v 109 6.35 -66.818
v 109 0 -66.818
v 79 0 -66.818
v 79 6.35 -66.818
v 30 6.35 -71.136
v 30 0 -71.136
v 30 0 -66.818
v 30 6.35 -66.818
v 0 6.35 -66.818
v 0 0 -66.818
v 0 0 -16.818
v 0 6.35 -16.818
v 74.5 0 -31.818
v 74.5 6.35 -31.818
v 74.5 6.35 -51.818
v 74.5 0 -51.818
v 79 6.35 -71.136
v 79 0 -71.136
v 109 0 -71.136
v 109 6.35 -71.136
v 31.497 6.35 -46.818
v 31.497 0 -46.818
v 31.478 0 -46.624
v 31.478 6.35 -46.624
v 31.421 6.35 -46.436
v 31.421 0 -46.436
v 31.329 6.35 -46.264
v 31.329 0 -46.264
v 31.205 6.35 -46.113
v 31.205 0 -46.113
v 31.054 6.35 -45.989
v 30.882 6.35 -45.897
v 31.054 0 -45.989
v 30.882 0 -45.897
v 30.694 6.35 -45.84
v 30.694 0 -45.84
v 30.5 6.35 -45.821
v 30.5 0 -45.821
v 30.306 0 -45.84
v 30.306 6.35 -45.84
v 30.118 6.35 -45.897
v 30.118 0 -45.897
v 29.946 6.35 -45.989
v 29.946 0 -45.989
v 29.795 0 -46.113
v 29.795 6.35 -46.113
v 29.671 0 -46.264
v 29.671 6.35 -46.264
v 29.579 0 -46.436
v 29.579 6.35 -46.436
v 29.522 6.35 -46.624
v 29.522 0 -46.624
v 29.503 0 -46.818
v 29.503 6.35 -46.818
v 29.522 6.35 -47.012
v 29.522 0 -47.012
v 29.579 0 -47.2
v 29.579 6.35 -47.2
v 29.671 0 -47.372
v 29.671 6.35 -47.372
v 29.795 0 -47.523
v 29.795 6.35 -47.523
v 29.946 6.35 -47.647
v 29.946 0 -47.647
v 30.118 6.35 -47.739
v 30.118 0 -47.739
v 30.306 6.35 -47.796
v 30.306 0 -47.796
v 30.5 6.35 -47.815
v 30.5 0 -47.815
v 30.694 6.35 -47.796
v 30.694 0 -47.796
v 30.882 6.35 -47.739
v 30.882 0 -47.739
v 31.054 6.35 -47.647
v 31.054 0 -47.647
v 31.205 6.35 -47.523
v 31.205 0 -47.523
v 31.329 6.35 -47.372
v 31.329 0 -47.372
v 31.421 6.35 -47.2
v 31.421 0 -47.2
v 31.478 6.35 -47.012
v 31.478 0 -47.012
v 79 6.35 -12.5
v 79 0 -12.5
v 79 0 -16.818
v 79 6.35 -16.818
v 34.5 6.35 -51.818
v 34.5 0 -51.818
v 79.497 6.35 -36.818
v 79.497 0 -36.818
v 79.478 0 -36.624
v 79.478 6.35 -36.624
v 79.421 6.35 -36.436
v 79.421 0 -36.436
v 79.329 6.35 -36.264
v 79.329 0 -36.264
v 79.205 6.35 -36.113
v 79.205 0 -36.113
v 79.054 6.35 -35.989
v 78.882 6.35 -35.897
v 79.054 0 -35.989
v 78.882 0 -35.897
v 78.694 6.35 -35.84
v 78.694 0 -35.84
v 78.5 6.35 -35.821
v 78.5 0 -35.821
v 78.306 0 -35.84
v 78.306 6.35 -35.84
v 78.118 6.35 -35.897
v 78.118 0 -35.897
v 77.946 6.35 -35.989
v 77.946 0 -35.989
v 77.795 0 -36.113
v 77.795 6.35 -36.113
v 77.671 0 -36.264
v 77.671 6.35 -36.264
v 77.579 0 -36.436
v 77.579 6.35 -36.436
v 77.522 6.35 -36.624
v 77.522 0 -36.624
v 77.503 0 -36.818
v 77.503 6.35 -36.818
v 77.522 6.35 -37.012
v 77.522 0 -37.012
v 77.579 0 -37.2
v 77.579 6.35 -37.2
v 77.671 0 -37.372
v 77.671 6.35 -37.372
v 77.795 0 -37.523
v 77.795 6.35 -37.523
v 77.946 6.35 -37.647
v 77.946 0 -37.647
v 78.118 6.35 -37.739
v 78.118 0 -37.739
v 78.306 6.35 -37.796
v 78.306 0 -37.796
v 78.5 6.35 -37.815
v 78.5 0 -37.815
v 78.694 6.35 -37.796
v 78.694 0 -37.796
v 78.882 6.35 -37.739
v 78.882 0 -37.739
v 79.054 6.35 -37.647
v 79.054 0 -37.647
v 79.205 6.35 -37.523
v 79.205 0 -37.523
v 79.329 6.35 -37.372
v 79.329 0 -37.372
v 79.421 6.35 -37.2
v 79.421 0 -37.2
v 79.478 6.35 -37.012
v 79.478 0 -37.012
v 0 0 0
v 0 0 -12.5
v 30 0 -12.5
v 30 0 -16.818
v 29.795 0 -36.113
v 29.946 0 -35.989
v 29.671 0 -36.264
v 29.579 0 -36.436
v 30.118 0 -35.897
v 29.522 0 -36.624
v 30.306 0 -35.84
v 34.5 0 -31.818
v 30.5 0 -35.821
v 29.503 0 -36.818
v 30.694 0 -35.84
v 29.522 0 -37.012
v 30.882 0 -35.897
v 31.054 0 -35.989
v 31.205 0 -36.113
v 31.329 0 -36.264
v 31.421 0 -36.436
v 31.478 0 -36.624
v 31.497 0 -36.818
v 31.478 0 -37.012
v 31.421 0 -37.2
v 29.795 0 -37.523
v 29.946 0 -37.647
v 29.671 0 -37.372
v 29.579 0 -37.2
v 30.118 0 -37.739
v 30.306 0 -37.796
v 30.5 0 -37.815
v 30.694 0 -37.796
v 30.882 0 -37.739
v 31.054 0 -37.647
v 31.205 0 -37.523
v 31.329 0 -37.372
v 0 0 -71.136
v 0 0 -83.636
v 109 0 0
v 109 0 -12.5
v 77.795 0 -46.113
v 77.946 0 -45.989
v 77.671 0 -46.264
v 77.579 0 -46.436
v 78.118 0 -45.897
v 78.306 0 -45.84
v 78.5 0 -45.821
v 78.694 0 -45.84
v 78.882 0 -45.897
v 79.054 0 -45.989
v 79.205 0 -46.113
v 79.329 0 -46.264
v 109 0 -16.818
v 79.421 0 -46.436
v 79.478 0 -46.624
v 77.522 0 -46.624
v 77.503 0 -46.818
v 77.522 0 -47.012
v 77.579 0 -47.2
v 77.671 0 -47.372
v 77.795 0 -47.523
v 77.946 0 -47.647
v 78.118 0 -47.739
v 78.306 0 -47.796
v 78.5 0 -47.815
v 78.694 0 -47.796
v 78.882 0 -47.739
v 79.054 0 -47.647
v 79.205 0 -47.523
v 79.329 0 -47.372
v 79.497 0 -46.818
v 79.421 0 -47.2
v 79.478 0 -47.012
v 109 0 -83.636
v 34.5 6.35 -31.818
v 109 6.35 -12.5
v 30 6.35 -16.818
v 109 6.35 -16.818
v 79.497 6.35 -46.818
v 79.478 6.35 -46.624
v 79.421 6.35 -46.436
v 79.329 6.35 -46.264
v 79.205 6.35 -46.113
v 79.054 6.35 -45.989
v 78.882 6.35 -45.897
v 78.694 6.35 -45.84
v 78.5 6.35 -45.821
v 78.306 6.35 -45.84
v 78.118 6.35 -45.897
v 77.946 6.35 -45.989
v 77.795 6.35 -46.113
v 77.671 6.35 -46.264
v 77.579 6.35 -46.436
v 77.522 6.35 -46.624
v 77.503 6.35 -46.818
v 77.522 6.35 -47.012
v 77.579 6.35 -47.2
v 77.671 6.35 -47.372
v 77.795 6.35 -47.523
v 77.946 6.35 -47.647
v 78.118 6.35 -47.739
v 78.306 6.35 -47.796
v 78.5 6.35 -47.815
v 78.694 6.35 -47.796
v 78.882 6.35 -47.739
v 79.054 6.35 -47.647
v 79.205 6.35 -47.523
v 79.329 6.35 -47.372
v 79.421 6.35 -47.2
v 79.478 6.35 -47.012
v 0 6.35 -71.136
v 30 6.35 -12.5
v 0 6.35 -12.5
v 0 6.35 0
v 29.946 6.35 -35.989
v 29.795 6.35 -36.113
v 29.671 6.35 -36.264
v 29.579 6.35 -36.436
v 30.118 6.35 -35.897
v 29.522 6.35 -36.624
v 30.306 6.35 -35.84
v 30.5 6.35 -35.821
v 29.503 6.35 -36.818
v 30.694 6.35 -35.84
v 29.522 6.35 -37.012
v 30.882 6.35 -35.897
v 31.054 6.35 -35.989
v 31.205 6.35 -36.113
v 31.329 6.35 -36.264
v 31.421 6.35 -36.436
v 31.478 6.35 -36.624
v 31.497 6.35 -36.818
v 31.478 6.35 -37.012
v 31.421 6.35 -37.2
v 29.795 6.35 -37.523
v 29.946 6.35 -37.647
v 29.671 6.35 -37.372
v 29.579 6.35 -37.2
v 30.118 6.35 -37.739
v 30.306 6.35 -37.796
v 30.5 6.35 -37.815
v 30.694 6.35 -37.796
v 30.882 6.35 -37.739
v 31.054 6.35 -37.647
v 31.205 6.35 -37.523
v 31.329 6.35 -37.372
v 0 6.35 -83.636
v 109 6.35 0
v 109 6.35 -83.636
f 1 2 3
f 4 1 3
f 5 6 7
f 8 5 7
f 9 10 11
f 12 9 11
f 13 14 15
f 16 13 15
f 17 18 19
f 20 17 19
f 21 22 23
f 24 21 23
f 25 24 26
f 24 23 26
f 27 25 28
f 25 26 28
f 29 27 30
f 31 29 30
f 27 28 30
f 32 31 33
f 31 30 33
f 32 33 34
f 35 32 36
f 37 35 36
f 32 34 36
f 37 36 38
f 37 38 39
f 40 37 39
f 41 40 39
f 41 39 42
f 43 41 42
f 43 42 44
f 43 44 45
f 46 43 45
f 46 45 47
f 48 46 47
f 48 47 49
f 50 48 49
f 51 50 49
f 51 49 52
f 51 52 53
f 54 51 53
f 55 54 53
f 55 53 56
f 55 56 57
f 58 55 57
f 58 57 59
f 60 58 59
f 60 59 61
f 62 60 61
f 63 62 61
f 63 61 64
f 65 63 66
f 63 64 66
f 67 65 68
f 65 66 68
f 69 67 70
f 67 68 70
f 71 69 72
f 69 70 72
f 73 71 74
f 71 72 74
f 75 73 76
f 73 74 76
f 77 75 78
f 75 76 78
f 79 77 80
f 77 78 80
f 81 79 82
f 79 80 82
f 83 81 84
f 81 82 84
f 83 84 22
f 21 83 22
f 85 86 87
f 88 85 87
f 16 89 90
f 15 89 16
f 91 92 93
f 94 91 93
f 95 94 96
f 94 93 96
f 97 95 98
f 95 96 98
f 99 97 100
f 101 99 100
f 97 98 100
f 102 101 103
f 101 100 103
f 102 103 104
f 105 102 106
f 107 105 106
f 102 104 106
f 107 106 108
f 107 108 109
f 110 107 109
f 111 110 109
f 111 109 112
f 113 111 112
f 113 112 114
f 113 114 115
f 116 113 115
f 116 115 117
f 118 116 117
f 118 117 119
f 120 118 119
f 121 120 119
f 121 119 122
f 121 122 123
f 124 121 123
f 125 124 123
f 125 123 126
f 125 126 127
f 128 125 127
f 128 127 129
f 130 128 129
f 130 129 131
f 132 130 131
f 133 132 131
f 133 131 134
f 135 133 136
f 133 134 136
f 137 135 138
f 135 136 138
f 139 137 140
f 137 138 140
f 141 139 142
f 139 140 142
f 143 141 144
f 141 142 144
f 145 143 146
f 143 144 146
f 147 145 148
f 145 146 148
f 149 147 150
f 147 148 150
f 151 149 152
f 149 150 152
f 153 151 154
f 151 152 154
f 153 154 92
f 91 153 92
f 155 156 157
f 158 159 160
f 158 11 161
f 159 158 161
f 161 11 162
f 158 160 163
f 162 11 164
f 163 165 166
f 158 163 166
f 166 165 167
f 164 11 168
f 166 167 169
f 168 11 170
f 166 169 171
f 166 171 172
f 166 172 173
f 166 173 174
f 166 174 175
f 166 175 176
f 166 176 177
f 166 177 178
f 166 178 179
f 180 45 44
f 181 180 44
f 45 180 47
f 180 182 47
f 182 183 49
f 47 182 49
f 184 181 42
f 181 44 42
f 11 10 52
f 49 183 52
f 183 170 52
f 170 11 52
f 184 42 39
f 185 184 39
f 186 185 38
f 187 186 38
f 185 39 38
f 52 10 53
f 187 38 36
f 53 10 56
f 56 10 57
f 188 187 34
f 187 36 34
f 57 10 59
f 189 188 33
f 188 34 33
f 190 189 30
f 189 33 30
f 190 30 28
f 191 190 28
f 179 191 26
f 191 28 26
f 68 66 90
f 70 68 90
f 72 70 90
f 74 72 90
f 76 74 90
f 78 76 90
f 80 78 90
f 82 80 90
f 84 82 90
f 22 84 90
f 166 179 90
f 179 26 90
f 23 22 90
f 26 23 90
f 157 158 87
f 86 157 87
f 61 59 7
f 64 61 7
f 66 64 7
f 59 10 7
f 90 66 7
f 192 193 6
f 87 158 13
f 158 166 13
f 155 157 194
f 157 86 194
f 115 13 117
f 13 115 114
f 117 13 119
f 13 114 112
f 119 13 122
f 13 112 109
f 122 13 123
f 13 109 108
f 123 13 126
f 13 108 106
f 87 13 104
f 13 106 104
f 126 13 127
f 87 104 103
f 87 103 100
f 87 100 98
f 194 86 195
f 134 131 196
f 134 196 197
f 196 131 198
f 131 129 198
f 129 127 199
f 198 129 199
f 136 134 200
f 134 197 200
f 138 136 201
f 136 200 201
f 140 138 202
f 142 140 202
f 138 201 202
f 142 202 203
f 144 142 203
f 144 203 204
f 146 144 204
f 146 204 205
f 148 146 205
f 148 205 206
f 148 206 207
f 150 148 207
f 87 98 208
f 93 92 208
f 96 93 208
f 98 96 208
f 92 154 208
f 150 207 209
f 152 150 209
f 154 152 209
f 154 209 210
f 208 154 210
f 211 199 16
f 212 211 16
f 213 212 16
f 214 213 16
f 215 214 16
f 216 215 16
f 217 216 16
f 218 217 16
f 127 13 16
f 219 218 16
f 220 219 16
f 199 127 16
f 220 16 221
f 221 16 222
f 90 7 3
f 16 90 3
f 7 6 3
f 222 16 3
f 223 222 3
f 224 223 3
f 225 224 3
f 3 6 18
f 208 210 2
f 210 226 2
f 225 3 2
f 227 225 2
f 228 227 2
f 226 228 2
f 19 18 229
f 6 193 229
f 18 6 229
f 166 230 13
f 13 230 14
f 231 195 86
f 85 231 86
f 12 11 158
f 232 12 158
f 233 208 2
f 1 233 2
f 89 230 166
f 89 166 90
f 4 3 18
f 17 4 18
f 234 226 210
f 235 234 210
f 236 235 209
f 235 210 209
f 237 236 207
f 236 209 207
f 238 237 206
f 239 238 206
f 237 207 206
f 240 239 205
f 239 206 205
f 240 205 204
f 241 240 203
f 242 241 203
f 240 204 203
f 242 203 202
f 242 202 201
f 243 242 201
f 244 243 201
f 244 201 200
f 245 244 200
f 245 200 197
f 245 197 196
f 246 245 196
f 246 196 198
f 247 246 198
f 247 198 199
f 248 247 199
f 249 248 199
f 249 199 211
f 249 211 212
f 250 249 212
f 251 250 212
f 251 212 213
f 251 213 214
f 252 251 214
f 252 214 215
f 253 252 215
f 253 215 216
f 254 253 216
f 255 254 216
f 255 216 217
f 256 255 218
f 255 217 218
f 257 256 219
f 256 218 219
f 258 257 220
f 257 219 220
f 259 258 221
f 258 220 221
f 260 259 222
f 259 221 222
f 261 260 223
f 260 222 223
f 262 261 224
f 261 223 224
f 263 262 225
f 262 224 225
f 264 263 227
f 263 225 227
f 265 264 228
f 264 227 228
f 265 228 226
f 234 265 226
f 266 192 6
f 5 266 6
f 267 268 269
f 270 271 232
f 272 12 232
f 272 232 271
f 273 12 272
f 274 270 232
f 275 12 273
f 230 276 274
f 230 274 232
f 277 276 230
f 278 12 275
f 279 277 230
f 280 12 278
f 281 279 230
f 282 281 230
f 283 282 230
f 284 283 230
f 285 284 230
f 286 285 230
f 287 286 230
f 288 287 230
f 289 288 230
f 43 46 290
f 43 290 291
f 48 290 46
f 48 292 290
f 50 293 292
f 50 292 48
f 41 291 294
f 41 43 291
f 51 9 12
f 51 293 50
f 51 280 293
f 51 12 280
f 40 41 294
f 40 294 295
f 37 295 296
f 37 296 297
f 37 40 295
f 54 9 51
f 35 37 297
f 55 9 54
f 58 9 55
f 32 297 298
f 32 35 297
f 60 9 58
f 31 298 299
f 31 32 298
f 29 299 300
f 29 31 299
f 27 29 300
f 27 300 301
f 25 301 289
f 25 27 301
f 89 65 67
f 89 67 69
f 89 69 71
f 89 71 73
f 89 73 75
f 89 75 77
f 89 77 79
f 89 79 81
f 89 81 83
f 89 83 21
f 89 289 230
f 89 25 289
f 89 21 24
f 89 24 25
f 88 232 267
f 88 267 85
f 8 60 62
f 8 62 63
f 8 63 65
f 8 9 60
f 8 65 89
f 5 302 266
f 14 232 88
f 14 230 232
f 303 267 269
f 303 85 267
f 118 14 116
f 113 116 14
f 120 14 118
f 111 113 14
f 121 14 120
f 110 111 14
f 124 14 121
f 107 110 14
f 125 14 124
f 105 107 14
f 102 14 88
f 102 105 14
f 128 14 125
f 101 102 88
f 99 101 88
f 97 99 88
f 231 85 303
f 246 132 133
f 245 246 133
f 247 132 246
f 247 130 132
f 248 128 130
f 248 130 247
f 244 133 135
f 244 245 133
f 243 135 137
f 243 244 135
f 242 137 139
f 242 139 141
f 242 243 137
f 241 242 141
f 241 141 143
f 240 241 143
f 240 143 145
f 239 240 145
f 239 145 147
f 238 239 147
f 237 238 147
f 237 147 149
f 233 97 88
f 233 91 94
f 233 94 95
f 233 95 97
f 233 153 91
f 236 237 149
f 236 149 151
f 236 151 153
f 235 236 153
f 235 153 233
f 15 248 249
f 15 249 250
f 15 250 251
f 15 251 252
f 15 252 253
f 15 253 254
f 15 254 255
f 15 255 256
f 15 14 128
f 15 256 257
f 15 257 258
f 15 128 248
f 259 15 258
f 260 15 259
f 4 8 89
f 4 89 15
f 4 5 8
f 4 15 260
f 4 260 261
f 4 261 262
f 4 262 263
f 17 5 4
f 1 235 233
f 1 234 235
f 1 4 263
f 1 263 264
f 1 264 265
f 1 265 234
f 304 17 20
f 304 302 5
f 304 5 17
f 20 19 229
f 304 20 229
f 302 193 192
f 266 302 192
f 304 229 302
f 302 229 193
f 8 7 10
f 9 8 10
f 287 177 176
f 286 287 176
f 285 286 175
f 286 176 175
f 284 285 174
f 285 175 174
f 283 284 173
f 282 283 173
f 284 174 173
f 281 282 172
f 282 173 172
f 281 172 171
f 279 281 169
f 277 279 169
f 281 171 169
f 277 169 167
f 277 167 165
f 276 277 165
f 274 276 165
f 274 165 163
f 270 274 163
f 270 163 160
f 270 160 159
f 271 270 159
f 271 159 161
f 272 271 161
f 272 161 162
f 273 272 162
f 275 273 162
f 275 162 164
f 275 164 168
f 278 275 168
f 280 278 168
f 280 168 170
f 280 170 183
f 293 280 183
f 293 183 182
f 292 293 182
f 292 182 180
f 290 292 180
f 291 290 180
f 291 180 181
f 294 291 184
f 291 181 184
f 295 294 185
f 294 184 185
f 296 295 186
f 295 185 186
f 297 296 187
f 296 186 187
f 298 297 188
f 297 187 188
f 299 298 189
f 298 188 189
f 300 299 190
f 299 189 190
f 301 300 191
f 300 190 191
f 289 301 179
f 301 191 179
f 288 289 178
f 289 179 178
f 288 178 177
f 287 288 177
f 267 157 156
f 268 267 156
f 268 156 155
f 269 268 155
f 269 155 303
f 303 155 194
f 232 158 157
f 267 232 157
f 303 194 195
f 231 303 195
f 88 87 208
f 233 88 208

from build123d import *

# Parameters (mm, degrees)
MAIN_SHAPE_DEPTH                            = 6.35
SKETCH2_W                                   = 40
SKETCH2_H                                   = 20
CUT_FOR_SERVO_MOUNTING_HOLE_LOCATIONS_DEPTH = 7.35
F_3_48_TAPPED_HOLE1_D                       = 1.9939
F_3_48_TAPPED_HOLE1_DEPTH                   = 7.67
F_3_48_TAPPED_HOLE1_TIP                     = 0.599027994


with BuildPart() as part:
    # Sketch1 → main shape (new body)
    with BuildSketch(Plane(origin=(0, 0, 0), x_dir=(1, 0, 0), z_dir=(0, 1, 0))):
        Polygon((0, 66.818), (0, 16.818), (30, 16.818), (30, 12.5), (0, 12.5), (0, 0), (109, 0), (109, 12.5), (79, 12.5), (79, 16.818), (109, 16.818), (109, 66.818), (79, 66.818), (79, 71.136), (109, 71.136), (109, 83.636), (0, 83.636), (0, 71.136), (30, 71.136), (30, 66.818), align=None)
    extrude(amount=MAIN_SHAPE_DEPTH)

    # Sketch2 → cut for servo + mounting hole locations (cut, through all)
    with BuildSketch(Plane(origin=(0, 6.35, 0), x_dir=(1, 0, 0), z_dir=(0, 1, 0))):
        with Locations((54.5, 41.818)):
            Rectangle(SKETCH2_W, SKETCH2_H)
    extrude(amount=-CUT_FOR_SERVO_MOUNTING_HOLE_LOCATIONS_DEPTH, mode=Mode.SUBTRACT)

    # #3-48 Tapped Hole1
    with Locations(Plane(origin=(0, 6.35, 0), x_dir=(-1, 0, 0), z_dir=(0, 1, 0))):
        with Locations((-30.5, -36.818), (-30.5, -46.818), (-78.5, -36.818), (-78.5, -46.818)):
            Hole(F_3_48_TAPPED_HOLE1_D / 2, depth=F_3_48_TAPPED_HOLE1_DEPTH)
            with Locations((0, 0, -(F_3_48_TAPPED_HOLE1_DEPTH + F_3_48_TAPPED_HOLE1_TIP / 2))):  # 118° drill point
                Cone(0, F_3_48_TAPPED_HOLE1_D / 2, F_3_48_TAPPED_HOLE1_TIP, mode=Mode.SUBTRACT)


solid = part.part
